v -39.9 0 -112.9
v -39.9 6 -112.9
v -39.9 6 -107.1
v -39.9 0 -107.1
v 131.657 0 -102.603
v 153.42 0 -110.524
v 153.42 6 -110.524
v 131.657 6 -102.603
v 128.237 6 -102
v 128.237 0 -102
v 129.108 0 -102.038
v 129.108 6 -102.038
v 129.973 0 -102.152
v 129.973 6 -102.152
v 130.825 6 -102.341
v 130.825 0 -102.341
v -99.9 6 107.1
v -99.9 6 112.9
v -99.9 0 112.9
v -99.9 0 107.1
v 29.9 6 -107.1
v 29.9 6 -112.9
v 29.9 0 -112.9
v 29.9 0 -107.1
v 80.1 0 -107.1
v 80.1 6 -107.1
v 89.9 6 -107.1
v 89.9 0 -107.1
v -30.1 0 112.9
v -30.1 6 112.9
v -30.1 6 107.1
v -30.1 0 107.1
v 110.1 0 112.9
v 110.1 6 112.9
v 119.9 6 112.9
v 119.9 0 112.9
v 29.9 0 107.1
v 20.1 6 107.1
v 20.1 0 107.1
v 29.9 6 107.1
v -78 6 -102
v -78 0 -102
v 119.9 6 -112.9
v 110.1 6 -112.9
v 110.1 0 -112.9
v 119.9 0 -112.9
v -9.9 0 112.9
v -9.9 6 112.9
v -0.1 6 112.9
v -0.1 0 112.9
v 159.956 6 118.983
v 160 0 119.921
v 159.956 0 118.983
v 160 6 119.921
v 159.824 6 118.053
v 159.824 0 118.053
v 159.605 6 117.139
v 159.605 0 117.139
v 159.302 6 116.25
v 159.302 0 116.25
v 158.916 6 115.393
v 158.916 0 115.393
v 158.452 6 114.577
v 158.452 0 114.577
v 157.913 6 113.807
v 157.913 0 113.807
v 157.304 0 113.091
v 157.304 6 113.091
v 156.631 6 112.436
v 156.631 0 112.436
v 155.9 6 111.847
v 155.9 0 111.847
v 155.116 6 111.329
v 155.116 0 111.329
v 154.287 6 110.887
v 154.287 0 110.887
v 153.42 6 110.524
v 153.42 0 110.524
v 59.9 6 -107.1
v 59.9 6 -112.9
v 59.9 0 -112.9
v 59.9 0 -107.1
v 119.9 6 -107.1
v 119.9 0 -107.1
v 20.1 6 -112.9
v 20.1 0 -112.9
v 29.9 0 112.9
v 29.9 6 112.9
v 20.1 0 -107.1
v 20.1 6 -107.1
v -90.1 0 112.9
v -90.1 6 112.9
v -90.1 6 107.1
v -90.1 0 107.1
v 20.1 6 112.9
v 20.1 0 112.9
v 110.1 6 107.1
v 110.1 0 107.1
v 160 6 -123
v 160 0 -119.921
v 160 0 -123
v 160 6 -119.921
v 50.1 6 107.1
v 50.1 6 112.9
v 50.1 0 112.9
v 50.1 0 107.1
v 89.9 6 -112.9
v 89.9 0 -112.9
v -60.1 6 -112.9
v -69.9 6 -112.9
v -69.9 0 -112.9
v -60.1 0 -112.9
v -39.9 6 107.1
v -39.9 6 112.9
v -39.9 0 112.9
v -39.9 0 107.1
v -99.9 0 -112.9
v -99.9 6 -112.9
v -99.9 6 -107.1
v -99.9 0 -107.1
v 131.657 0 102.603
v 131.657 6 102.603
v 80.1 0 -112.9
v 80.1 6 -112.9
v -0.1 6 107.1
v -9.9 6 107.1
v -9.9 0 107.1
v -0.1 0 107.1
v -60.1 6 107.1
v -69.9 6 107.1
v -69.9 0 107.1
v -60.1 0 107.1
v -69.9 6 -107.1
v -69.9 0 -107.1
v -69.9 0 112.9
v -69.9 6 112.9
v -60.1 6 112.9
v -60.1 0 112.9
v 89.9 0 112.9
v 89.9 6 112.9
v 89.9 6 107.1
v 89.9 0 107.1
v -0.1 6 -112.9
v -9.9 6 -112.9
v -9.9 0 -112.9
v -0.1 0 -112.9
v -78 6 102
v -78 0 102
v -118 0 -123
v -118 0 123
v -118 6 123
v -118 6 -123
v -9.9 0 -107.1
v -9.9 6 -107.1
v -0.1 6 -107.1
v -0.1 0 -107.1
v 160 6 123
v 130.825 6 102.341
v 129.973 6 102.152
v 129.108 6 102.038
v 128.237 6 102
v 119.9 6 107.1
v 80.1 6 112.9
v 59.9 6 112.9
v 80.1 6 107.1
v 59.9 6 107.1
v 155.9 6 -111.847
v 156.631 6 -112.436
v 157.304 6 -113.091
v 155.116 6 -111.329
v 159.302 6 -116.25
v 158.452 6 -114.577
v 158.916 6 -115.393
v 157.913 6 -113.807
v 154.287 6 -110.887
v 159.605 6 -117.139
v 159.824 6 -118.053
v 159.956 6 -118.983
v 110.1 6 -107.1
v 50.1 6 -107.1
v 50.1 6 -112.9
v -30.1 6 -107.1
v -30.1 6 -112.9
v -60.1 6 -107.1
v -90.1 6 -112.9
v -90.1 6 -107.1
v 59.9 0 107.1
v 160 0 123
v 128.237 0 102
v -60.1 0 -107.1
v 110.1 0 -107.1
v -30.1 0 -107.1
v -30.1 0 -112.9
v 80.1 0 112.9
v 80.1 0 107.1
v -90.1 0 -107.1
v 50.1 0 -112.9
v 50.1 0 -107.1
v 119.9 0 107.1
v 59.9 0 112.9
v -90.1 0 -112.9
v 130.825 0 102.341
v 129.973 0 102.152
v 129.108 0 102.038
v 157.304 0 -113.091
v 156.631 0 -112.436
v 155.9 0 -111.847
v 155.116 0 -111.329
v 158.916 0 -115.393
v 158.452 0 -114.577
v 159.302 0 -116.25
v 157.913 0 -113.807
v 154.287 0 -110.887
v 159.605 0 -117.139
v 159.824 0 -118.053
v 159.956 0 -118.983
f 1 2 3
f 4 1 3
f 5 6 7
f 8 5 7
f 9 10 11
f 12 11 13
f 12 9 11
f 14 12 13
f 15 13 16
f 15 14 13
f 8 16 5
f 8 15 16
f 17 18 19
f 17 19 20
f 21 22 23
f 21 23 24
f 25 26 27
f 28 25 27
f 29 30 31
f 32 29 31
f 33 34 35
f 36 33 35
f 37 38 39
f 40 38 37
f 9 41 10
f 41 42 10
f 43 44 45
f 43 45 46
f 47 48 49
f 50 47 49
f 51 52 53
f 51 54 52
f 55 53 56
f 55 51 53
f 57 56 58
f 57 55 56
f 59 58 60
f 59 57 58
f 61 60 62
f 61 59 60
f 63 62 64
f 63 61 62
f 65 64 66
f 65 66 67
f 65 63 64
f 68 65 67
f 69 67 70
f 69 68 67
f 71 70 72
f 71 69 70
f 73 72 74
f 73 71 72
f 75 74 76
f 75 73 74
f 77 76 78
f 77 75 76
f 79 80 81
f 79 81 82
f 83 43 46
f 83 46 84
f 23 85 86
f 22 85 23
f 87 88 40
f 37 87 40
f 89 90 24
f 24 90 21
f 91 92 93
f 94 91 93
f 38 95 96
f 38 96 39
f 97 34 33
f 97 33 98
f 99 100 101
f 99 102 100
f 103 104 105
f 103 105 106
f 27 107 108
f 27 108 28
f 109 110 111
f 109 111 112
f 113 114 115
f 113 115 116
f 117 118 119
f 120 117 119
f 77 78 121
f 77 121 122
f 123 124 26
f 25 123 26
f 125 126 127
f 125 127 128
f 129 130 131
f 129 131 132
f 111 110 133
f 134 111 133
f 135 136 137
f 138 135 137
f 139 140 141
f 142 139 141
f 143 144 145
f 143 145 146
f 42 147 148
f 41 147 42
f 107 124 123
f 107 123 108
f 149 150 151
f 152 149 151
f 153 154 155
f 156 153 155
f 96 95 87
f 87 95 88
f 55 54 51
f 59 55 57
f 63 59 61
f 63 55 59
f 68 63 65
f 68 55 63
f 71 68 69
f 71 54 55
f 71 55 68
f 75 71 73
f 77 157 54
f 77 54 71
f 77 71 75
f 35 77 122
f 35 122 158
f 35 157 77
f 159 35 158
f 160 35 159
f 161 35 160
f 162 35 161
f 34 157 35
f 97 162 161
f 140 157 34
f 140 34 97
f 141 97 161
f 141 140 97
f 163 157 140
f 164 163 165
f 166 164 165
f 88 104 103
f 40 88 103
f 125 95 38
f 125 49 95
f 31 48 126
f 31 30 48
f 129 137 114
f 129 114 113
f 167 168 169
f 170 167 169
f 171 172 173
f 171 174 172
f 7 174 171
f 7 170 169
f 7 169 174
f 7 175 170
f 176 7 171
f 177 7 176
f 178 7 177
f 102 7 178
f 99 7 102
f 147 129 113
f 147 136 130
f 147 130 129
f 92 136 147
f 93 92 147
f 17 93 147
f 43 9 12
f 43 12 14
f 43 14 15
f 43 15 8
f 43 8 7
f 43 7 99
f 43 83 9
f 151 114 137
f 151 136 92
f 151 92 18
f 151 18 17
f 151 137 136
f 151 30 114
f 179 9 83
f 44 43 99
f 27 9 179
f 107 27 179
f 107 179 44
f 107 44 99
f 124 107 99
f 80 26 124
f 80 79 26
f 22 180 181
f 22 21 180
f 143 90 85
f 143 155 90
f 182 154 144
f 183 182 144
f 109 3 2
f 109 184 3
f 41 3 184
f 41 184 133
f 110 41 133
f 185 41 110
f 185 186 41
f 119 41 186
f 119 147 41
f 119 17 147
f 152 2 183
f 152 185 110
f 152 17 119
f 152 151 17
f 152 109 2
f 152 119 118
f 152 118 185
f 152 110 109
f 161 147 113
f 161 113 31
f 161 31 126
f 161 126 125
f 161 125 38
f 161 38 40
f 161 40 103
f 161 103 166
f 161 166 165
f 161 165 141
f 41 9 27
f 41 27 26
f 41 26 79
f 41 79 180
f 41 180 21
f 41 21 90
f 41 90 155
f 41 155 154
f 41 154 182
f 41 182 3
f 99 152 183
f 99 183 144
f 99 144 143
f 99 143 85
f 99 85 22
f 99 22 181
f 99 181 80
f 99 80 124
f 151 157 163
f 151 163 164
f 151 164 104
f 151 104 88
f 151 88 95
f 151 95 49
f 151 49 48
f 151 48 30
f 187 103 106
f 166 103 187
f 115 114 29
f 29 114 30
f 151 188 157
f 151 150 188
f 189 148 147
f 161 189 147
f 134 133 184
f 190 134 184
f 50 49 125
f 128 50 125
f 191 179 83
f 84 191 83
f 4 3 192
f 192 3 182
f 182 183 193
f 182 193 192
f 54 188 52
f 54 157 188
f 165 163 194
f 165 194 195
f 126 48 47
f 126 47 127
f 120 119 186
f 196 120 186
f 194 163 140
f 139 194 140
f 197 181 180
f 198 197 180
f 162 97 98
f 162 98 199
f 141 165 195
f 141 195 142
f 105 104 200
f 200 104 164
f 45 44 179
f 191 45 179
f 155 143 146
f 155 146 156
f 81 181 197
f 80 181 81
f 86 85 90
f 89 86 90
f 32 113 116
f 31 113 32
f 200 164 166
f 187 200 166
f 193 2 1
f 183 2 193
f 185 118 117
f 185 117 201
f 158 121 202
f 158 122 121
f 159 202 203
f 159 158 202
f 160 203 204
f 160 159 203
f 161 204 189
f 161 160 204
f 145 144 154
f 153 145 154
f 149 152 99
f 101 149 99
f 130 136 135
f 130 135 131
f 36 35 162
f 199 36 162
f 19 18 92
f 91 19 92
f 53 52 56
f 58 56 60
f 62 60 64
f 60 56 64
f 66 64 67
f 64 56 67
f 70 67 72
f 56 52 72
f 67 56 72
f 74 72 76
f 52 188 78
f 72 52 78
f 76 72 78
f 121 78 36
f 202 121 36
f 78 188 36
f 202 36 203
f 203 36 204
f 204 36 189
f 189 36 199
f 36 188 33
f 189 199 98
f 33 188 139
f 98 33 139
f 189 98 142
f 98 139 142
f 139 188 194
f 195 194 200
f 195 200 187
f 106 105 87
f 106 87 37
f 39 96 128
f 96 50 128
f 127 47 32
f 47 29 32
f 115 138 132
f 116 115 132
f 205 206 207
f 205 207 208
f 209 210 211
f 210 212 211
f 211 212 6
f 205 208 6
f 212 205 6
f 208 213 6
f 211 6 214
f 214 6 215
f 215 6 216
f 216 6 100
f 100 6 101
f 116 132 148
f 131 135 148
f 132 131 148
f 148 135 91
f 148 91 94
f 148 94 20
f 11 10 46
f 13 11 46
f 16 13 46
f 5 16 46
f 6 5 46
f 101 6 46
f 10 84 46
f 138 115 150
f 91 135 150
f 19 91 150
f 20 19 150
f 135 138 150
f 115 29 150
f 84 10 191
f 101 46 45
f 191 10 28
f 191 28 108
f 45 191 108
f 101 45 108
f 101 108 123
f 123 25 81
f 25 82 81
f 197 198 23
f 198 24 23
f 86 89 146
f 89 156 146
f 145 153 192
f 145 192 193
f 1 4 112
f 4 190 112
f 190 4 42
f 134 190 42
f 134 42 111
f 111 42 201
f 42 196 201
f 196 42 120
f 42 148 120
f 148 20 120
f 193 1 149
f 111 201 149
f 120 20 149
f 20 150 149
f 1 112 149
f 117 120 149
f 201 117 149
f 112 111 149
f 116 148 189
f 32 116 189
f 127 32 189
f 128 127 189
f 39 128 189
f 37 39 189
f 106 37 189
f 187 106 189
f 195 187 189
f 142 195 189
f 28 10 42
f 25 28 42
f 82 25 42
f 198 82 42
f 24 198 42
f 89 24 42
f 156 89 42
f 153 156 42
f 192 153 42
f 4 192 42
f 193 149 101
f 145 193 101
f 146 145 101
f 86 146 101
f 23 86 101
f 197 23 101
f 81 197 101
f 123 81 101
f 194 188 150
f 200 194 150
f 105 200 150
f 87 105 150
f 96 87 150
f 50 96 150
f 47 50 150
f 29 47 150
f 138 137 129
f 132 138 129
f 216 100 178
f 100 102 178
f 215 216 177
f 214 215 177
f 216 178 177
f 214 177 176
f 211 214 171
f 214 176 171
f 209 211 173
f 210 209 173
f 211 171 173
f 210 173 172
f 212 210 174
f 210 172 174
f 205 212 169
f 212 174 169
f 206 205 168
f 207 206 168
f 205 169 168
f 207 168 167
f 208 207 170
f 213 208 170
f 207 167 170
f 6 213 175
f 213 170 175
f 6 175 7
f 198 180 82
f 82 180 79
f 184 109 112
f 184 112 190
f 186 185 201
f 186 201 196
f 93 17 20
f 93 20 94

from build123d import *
from OCP.BRepFilletAPI import BRepFilletAPI_MakeChamfer

# Parameters (mm, degrees)
BOSS_EXTRUDE1_DEPTH = 6
SKETCH2_W           = 9.8
SKETCH2_H           = 5.8
CUT_EXTRUDE1_DEPTH  = 6
SKETCH5_W           = 20
SKETCH5_H           = 236
CUT_EXTRUDE2_DEPTH  = 6
SKETCH6_W           = 10
SKETCH6_H           = 204
CUT_EXTRUDE3_DEPTH  = 20
SKETCH7_W           = 32
SKETCH7_H           = 236
CUT_EXTRUDE4_DEPTH  = 20
SKETCH8_W           = 248
SKETCH8_H           = 6
BOSS_EXTRUDE2_DEPTH = 5
SKETCH10_W          = 30
SKETCH10_H          = 204
BOSS_EXTRUDE3_DEPTH = 6
SKETCH11_W          = 21
SKETCH11_H          = 6
BOSS_EXTRUDE4_DEPTH = 30
CHAMFER1_SIZE       = 30
CHAMFER1_SIZE2      = 10.919107028
FILLET1_R           = 10


with BuildPart() as part:
    # Sketch1 → Boss-Extrude1 (new body)
    with BuildSketch(Plane(origin=(0, 0, 0), x_dir=(1, 0, 0), z_dir=(0, 1, 0))):
        Polygon((-150, 118), (-150, -118), (150, -118), (150, -102), (-98, -102), (-98, 102), (150, 102), (150, 118), align=None)
    extrude(amount=BOSS_EXTRUDE1_DEPTH)

    # Sketch2 → Cut-Extrude1 (cut)
    with BuildSketch(Plane(origin=(0, 6, 0), x_dir=(1, 0, 0), z_dir=(0, 1, 0))):
        with Locations((85, -110)):
            Rectangle(SKETCH2_W, SKETCH2_H)
        with Locations((115, -110)):
            Rectangle(SKETCH2_W, SKETCH2_H)
        with Locations((55, -110)):
            Rectangle(SKETCH2_W, SKETCH2_H)
        with Locations((25, -110)):
            Rectangle(SKETCH2_W, SKETCH2_H)
        with Locations((-5, -110)):
            Rectangle(SKETCH2_W, SKETCH2_H)
        with Locations((-35, -110)):
            Rectangle(SKETCH2_W, SKETCH2_H)
        with Locations((-65, -110)):
            Rectangle(SKETCH2_W, SKETCH2_H)
        with Locations((-95, -110)):
            Rectangle(SKETCH2_W, SKETCH2_H)
    cut_extrude1 = extrude(amount=-CUT_EXTRUDE1_DEPTH, mode=Mode.SUBTRACT)

    # Mirror1: Cut-Extrude1 across plane
    add(cut_extrude1.mirror(Plane.XY), mode=Mode.SUBTRACT)

    # Sketch5 → Cut-Extrude2 (cut)
    with BuildSketch(Plane(origin=(0, 6, 0), x_dir=(1, 0, 0), z_dir=(0, 1, 0))):
        with Locations((140, 0)):
            Rectangle(SKETCH5_W, SKETCH5_H)
    extrude(amount=-CUT_EXTRUDE2_DEPTH, mode=Mode.SUBTRACT)

    # Sketch6 → Cut-Extrude3 (cut)
    with BuildSketch(Plane(origin=(0, 6, 0), x_dir=(1, 0, 0), z_dir=(0, 1, 0))):
        with Locations((-103, 0)):
            Rectangle(SKETCH6_W, SKETCH6_H)
    extrude(amount=-CUT_EXTRUDE3_DEPTH, mode=Mode.SUBTRACT)

    # Sketch7 → Cut-Extrude4 (cut)
    with BuildSketch(Plane(origin=(0, 6, 0), x_dir=(1, 0, 0), z_dir=(0, 1, 0))):
        with Locations((-134, 0)):
            Rectangle(SKETCH7_W, SKETCH7_H)
    extrude(amount=-CUT_EXTRUDE4_DEPTH, mode=Mode.SUBTRACT)

    # Sketch8 → Boss-Extrude2 (add)
    with BuildSketch(Plane.XY.offset(118)):
        with Locations((6, 3)):
            Rectangle(SKETCH8_W, SKETCH8_H)
    boss_extrude2 = extrude(amount=BOSS_EXTRUDE2_DEPTH)

    # Mirror2: Boss-Extrude2 across plane
    add(boss_extrude2.mirror(Plane.XY))

    # Sketch10 → Boss-Extrude3 (add, through all)
    with BuildSketch(Plane(origin=(0, 6, 0), x_dir=(1, 0, 0), z_dir=(0, 1, 0))):
        with Locations((-93, 0)):
            Rectangle(SKETCH10_W, SKETCH10_H)
    extrude(amount=-BOSS_EXTRUDE3_DEPTH)

    # Sketch11 → Boss-Extrude4 (add)
    with BuildSketch(Plane(origin=(130, 0, 0), x_dir=(0, 0, -1), z_dir=(1, 0, 0))):
        with Locations((-112.5, 3)):
            Rectangle(SKETCH11_W, SKETCH11_H)
        with Locations((112.5, 3)):
            Rectangle(SKETCH11_W, SKETCH11_H)
    extrude(amount=BOSS_EXTRUDE4_DEPTH)

    # Chamfer1: one chamfer whose edges measure the first distance from different faces: ONE call of the kernel's chamfer builder (chamfer() names one face for all edges)
    chamfer1_edges_1 = [part.edges().sort_by_distance(p)[0] for p in [
        (160, 3, 102),
    ]]
    chamfer1_side_1 = [part.faces().sort_by_distance(p)[0] for p in [
        (41, 3, 102),
    ]]
    chamfer1_edges_2 = [part.edges().sort_by_distance(p)[0] for p in [
        (160, 3, -102),
    ]]
    chamfer1_side_2 = [part.faces().sort_by_distance(p)[0] for p in [
        (41, 3, -102),
    ]]
    chamfer1 = BRepFilletAPI_MakeChamfer(part.part.solid().wrapped)
    for e in chamfer1_edges_1:
        chamfer1.Add(CHAMFER1_SIZE, CHAMFER1_SIZE2, e.wrapped, chamfer1_side_1[0].wrapped)  # the first distance lies on this face
    for e in chamfer1_edges_2:
        chamfer1.Add(CHAMFER1_SIZE, CHAMFER1_SIZE2, e.wrapped, chamfer1_side_2[0].wrapped)  # the first distance lies on this face
    add(Compound.cast(chamfer1.Shape()), mode=Mode.REPLACE)

    # Fillet1
    fillet1_edges = [part.edges().sort_by_distance(p)[0] for p in [
        (160, 3, 112.919107028),
        (130, 3, 102),
        (160, 3, -112.919107028),
        (130, 3, -102),
    ]]
    fillet(fillet1_edges, radius=FILLET1_R)


solid = part.part
